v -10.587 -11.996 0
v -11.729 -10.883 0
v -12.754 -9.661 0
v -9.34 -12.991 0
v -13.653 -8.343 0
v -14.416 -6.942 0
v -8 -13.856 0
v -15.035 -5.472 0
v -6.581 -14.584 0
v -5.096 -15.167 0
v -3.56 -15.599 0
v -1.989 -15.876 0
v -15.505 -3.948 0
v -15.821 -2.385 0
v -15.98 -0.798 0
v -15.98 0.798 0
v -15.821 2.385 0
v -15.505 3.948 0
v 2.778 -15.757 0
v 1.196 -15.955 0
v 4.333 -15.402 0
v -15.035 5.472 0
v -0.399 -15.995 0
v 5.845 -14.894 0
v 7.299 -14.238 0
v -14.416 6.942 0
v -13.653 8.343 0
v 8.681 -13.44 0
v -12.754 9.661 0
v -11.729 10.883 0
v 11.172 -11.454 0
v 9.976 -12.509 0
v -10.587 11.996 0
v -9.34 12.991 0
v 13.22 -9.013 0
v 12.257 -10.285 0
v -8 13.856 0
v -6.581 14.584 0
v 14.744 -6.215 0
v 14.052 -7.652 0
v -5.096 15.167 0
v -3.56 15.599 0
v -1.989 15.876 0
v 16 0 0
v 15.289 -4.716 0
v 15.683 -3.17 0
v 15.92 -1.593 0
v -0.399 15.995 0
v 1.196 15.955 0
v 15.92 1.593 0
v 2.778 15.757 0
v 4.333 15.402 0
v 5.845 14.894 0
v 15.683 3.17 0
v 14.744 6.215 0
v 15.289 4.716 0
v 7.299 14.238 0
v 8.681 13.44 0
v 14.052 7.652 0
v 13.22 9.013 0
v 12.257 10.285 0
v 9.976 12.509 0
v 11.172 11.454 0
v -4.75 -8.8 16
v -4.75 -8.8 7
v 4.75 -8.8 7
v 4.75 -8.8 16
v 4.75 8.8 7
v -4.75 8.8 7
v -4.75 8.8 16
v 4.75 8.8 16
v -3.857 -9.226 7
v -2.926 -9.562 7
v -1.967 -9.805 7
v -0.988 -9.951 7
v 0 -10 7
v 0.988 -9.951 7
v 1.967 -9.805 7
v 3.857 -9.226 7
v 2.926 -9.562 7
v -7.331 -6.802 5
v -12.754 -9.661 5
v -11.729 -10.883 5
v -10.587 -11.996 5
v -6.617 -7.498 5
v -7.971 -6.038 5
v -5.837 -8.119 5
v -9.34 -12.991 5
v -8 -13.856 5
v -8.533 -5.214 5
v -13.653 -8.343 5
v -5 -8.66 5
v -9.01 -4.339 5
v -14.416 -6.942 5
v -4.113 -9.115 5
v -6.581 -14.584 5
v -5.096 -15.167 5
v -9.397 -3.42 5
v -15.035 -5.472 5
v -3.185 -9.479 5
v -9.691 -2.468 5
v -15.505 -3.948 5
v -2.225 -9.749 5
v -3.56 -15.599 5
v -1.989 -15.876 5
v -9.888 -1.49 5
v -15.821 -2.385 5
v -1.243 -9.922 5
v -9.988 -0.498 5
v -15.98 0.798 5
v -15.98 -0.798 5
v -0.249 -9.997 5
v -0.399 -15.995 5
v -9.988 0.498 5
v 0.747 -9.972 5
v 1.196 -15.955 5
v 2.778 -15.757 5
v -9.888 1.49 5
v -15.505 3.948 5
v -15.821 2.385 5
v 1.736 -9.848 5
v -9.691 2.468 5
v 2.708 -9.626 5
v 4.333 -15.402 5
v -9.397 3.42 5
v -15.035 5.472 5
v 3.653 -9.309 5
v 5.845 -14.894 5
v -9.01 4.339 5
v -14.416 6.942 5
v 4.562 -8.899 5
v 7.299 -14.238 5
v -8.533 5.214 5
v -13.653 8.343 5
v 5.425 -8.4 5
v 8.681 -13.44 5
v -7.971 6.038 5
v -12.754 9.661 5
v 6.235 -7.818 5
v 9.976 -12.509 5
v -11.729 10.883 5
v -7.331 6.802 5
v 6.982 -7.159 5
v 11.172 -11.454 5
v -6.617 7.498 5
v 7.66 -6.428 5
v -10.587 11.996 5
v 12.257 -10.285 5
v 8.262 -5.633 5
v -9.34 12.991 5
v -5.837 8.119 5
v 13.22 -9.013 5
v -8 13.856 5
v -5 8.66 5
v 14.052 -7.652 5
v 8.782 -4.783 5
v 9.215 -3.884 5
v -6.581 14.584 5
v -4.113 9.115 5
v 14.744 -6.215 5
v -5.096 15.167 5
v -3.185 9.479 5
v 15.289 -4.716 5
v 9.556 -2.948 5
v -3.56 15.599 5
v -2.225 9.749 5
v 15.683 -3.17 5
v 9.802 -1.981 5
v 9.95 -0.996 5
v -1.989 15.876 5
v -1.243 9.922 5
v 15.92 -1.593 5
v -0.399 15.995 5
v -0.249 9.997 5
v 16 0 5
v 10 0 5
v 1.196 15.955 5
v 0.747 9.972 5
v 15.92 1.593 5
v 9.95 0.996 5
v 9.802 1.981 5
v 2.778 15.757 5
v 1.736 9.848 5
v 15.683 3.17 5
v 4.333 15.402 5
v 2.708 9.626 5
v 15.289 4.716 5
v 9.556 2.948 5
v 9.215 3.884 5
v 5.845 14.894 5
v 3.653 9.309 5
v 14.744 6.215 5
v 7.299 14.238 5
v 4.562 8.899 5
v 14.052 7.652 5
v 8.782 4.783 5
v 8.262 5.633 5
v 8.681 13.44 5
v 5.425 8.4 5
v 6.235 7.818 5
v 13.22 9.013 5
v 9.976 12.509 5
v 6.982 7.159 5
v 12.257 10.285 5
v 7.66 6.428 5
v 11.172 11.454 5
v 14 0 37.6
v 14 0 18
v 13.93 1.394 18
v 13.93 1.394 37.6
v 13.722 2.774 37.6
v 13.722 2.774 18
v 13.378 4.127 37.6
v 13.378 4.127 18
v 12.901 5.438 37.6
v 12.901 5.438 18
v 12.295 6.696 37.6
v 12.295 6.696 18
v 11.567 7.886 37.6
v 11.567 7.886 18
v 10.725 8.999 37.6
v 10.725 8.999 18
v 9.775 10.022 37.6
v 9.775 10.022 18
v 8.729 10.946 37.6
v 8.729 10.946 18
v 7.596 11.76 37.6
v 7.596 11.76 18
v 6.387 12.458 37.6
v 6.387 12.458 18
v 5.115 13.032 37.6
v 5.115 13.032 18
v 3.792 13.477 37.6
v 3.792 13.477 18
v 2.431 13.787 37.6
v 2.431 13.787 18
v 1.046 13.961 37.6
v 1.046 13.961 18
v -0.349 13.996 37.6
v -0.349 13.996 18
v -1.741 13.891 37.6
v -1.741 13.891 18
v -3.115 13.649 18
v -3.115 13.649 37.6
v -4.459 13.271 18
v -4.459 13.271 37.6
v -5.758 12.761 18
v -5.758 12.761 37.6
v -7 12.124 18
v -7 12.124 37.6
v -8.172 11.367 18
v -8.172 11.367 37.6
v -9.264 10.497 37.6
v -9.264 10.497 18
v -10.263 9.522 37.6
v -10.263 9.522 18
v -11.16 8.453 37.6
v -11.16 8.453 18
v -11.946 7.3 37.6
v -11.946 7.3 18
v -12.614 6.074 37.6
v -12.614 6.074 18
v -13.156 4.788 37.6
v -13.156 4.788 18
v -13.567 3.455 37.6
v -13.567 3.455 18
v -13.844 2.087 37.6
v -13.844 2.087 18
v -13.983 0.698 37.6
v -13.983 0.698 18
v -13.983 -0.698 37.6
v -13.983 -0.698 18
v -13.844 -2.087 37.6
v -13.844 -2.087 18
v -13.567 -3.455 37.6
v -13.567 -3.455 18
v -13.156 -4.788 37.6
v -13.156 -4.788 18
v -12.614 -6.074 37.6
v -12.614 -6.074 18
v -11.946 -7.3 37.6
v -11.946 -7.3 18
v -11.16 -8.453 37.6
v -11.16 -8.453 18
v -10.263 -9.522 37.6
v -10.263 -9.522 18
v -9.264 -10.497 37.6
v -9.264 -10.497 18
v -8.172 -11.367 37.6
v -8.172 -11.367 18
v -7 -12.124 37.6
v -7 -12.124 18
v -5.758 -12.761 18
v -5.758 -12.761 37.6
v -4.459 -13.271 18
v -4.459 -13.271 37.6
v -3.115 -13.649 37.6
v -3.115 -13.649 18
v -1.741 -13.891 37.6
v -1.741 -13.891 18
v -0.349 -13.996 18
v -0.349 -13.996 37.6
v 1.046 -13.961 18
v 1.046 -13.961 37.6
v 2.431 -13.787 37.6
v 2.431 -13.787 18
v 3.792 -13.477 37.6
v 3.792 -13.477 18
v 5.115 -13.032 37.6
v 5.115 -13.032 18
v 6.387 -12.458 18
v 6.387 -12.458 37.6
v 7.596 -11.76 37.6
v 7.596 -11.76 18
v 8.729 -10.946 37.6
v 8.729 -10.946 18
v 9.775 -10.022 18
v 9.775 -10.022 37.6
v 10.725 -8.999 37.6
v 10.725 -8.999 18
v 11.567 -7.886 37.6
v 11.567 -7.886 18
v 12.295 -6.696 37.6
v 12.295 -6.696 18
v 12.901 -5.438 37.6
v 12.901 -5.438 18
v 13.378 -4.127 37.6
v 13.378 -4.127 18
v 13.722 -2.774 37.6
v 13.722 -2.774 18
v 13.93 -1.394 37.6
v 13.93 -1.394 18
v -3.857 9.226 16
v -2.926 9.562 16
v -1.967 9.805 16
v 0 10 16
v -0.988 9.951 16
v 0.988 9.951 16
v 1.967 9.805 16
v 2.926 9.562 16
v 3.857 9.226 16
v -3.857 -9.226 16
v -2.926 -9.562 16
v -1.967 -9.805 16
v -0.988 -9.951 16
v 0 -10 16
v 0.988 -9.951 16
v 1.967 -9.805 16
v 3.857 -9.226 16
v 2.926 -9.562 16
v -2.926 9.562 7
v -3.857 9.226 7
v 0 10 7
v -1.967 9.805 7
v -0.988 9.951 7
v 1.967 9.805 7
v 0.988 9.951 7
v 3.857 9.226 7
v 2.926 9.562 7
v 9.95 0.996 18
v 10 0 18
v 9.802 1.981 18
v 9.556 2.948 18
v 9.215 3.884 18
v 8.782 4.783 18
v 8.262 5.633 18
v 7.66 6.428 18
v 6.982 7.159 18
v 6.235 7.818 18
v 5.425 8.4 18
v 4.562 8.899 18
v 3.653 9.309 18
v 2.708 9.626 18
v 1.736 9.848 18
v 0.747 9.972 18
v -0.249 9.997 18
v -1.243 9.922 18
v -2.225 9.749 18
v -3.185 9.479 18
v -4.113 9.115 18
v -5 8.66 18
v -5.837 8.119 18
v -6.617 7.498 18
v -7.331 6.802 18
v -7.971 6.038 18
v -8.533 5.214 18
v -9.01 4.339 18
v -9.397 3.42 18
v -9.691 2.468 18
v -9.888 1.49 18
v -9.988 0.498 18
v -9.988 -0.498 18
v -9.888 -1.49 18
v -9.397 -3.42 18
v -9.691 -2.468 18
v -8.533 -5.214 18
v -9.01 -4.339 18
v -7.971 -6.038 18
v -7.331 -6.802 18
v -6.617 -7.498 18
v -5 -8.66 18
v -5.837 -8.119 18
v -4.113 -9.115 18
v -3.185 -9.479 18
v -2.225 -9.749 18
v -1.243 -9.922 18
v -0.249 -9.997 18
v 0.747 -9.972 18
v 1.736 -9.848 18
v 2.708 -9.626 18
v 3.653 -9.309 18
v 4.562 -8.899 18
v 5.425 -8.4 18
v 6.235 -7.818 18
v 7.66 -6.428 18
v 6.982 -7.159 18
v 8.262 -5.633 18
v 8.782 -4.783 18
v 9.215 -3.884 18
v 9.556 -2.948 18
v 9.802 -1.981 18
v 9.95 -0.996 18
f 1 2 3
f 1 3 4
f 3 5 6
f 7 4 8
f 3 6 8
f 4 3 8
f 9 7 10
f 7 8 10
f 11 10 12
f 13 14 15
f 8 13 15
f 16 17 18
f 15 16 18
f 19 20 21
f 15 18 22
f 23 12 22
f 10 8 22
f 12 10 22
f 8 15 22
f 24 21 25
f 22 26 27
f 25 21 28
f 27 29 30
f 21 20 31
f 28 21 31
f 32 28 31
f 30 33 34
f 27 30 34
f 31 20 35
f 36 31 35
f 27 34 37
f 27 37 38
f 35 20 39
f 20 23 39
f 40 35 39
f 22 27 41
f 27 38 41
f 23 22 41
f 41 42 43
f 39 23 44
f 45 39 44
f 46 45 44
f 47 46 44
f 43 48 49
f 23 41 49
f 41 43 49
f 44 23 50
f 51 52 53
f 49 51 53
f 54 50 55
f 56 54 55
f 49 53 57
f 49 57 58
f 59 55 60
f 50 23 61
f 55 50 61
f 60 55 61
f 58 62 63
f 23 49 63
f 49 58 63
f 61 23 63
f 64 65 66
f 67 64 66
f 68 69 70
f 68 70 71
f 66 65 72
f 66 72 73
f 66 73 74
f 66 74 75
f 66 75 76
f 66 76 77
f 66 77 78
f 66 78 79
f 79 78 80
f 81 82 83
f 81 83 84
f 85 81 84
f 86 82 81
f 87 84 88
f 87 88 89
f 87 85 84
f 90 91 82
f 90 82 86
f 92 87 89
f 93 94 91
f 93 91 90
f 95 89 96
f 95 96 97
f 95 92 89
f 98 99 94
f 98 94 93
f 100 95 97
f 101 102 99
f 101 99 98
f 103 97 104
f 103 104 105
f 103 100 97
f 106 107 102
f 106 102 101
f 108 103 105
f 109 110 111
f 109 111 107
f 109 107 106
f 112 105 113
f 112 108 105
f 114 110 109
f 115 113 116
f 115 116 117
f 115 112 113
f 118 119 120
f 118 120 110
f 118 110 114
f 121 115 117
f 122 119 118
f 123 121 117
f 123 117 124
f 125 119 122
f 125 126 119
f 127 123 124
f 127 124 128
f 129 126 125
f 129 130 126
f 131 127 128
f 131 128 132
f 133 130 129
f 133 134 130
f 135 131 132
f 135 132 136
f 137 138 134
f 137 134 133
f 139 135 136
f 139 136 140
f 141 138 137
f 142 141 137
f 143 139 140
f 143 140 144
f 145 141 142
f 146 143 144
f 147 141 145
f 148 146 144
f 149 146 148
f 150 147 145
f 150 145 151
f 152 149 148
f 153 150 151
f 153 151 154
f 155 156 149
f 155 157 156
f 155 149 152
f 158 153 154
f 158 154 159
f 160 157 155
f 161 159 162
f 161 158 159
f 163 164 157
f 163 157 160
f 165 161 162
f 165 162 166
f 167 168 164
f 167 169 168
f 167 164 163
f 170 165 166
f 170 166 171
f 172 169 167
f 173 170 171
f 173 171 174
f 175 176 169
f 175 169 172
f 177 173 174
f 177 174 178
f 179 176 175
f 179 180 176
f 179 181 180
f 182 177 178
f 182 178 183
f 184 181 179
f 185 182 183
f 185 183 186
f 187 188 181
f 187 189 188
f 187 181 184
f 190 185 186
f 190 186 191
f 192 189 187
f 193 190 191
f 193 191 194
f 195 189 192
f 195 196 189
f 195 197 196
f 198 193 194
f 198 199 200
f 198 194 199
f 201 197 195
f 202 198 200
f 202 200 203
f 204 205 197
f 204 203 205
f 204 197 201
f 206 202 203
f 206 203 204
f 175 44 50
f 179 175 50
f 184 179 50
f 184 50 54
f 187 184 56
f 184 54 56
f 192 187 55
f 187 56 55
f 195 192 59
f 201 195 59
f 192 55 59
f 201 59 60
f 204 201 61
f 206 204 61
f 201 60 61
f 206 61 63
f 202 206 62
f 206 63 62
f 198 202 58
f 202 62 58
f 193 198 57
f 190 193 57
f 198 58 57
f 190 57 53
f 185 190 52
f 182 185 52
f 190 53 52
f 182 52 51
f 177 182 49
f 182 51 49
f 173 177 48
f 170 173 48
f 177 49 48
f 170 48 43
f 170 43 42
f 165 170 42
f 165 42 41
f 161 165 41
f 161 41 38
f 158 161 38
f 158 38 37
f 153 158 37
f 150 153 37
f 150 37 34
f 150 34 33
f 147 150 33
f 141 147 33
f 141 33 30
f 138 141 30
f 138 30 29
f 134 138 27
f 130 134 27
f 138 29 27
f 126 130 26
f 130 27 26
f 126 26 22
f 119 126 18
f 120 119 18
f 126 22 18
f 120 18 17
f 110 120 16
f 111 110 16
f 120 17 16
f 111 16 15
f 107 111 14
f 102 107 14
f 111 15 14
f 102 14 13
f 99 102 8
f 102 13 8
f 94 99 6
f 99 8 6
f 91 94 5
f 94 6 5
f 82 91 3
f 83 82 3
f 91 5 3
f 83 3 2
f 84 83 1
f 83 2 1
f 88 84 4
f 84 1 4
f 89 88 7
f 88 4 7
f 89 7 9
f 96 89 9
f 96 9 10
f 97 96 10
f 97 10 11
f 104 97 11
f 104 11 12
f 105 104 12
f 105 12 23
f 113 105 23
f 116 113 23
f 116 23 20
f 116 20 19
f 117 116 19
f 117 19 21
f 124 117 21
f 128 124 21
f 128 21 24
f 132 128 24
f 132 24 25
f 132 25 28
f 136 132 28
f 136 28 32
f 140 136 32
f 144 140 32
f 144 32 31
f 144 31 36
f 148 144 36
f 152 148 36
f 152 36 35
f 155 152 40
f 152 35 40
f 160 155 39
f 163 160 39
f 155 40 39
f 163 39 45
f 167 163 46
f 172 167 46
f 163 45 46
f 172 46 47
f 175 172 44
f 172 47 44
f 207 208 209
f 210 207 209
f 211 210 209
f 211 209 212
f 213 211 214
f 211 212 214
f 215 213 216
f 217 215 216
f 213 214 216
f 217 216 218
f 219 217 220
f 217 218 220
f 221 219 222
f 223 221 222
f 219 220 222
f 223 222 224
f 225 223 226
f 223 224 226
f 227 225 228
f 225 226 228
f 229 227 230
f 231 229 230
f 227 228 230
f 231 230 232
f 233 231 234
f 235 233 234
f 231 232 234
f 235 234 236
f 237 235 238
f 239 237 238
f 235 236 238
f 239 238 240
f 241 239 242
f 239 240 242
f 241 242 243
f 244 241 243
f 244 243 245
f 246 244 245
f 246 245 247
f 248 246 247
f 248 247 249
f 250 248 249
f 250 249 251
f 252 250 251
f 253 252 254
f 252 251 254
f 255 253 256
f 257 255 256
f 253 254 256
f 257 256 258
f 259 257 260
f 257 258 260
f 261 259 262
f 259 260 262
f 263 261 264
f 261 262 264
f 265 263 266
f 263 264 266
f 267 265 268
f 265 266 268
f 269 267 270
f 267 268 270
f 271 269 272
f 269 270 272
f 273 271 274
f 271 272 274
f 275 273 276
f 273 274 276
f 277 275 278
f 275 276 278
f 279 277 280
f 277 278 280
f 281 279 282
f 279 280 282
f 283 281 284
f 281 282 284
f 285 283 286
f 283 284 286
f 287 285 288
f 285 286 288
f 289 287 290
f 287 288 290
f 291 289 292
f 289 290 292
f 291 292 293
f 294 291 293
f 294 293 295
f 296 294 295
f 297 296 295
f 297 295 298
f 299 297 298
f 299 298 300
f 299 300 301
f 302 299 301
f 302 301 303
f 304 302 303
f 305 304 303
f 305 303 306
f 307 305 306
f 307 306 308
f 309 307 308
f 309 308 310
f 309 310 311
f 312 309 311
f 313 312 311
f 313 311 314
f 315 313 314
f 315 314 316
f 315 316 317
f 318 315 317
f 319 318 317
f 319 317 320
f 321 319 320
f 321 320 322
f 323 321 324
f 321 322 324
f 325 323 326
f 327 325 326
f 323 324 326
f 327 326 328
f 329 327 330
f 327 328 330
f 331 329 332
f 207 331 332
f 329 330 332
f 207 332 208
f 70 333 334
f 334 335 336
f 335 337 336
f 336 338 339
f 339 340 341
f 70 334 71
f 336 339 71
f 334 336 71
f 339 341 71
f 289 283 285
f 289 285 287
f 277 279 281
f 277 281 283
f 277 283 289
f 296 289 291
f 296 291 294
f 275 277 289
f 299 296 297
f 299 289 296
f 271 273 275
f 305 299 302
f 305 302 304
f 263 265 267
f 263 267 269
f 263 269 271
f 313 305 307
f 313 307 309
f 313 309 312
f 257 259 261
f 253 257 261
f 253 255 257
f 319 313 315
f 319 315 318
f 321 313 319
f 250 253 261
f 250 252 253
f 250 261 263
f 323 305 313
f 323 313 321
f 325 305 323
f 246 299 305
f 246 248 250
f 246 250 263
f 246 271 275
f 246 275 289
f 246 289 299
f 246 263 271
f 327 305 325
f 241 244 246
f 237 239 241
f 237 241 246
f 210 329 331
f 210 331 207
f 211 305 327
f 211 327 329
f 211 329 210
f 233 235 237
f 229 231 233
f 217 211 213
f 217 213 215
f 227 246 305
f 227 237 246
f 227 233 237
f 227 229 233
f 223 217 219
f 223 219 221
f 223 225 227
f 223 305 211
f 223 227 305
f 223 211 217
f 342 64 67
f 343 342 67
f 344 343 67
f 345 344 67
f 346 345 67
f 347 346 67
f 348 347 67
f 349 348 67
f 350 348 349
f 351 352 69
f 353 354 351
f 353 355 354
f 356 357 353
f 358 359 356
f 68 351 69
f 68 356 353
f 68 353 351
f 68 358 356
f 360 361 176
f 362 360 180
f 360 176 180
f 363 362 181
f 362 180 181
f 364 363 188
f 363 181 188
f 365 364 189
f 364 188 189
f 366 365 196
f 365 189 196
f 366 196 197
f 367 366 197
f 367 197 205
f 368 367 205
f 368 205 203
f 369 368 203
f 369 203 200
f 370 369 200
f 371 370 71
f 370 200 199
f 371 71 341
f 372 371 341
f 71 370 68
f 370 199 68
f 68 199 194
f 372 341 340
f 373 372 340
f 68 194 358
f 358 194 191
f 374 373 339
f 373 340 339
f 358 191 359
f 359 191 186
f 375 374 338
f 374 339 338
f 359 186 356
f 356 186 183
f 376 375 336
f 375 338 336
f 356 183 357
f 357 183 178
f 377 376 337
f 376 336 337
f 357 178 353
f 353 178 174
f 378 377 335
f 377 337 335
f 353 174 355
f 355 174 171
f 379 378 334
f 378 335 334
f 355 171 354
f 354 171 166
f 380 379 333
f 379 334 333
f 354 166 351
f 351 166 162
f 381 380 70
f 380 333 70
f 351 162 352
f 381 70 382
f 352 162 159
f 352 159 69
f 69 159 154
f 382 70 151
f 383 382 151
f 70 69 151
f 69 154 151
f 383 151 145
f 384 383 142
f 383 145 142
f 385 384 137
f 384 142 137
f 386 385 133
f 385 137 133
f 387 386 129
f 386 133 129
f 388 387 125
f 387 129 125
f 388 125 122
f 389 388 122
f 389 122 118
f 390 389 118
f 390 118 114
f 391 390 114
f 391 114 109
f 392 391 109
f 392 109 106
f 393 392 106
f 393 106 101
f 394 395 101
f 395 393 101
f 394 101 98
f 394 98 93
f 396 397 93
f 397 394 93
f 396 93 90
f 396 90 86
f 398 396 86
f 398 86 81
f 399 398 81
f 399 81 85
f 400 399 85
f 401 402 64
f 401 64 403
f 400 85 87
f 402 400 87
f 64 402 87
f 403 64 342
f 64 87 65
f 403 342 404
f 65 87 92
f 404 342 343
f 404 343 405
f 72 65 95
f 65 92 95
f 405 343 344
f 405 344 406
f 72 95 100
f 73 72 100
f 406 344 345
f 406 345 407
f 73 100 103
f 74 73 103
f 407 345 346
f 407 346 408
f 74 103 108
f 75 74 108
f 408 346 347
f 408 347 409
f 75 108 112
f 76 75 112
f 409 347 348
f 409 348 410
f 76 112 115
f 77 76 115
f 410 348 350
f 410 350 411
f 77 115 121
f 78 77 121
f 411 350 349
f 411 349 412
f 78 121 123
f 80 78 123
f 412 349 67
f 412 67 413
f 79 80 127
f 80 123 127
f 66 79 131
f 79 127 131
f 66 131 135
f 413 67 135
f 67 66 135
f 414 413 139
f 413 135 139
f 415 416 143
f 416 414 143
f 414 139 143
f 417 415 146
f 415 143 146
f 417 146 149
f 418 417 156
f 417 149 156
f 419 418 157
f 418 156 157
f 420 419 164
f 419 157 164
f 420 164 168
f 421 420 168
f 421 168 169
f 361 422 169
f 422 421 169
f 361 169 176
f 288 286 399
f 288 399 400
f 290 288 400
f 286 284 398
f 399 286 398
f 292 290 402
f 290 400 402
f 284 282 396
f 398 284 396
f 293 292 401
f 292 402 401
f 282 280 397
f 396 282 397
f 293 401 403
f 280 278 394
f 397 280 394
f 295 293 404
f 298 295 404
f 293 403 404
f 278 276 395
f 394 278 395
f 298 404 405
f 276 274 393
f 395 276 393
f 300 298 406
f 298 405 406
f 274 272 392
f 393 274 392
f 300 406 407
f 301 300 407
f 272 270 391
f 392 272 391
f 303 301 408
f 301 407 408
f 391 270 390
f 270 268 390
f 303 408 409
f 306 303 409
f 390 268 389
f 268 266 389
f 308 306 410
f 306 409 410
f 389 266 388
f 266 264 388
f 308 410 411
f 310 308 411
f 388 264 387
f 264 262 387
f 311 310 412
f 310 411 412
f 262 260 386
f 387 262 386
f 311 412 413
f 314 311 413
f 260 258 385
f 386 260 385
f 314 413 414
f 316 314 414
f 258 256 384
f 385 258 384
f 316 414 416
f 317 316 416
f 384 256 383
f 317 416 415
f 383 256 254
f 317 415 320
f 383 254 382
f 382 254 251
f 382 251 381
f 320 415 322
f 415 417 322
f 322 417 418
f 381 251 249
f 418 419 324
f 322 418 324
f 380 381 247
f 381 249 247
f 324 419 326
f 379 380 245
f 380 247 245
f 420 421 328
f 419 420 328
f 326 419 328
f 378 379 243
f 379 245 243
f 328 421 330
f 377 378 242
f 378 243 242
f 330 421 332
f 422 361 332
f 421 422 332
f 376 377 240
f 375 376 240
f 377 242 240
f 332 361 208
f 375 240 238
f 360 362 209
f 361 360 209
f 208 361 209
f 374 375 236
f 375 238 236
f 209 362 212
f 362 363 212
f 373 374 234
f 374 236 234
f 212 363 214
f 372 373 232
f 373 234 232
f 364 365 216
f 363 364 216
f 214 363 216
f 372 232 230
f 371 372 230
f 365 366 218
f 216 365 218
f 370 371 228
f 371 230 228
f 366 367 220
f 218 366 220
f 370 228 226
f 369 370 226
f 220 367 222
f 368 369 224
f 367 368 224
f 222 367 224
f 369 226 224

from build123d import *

# Parameters (mm, degrees)
SKETCH1_R           = 16
BOSS_EXTRUDE1_DEPTH = 5
SKETCH2_R           = 10
BOSS_EXTRUDE2_DEPTH = 24
SKETCH4_OUTSIDE_W   = 44.75
SKETCH4_OUTSIDE_H   = 44.75
SKETCH4_OUTSIDE_W_2 = 24
SKETCH4_OUTSIDE_H_2 = 17.6
CUT_EXTRUDE1_DEPTH  = 9
SKETCH5_R           = 14
BOSS_EXTRUDE3_DEPTH = 19.6


with BuildPart() as part:
    # Sketch1 → Boss-Extrude1 (new body)
    with BuildSketch(Plane.XY):
        Circle(SKETCH1_R)
    extrude(amount=BOSS_EXTRUDE1_DEPTH)

    # Sketch2 → Boss-Extrude2 (add)
    with BuildSketch(Plane.XY.offset(5)):
        Circle(SKETCH2_R)
    extrude(amount=BOSS_EXTRUDE2_DEPTH)

    # Sketch4 outside → Cut-Extrude1 (cut)
    with BuildSketch(Plane.XY.offset(7)):
        Rectangle(SKETCH4_OUTSIDE_W, SKETCH4_OUTSIDE_H)
        Rectangle(SKETCH4_OUTSIDE_W_2, SKETCH4_OUTSIDE_H_2, mode=Mode.SUBTRACT)
    extrude(amount=CUT_EXTRUDE1_DEPTH, mode=Mode.SUBTRACT)

    # Sketch5 → Boss-Extrude3 (add)
    with BuildSketch(Plane.XY.offset(18)):
        Circle(SKETCH5_R)
    extrude(amount=BOSS_EXTRUDE3_DEPTH)


solid = part.part
